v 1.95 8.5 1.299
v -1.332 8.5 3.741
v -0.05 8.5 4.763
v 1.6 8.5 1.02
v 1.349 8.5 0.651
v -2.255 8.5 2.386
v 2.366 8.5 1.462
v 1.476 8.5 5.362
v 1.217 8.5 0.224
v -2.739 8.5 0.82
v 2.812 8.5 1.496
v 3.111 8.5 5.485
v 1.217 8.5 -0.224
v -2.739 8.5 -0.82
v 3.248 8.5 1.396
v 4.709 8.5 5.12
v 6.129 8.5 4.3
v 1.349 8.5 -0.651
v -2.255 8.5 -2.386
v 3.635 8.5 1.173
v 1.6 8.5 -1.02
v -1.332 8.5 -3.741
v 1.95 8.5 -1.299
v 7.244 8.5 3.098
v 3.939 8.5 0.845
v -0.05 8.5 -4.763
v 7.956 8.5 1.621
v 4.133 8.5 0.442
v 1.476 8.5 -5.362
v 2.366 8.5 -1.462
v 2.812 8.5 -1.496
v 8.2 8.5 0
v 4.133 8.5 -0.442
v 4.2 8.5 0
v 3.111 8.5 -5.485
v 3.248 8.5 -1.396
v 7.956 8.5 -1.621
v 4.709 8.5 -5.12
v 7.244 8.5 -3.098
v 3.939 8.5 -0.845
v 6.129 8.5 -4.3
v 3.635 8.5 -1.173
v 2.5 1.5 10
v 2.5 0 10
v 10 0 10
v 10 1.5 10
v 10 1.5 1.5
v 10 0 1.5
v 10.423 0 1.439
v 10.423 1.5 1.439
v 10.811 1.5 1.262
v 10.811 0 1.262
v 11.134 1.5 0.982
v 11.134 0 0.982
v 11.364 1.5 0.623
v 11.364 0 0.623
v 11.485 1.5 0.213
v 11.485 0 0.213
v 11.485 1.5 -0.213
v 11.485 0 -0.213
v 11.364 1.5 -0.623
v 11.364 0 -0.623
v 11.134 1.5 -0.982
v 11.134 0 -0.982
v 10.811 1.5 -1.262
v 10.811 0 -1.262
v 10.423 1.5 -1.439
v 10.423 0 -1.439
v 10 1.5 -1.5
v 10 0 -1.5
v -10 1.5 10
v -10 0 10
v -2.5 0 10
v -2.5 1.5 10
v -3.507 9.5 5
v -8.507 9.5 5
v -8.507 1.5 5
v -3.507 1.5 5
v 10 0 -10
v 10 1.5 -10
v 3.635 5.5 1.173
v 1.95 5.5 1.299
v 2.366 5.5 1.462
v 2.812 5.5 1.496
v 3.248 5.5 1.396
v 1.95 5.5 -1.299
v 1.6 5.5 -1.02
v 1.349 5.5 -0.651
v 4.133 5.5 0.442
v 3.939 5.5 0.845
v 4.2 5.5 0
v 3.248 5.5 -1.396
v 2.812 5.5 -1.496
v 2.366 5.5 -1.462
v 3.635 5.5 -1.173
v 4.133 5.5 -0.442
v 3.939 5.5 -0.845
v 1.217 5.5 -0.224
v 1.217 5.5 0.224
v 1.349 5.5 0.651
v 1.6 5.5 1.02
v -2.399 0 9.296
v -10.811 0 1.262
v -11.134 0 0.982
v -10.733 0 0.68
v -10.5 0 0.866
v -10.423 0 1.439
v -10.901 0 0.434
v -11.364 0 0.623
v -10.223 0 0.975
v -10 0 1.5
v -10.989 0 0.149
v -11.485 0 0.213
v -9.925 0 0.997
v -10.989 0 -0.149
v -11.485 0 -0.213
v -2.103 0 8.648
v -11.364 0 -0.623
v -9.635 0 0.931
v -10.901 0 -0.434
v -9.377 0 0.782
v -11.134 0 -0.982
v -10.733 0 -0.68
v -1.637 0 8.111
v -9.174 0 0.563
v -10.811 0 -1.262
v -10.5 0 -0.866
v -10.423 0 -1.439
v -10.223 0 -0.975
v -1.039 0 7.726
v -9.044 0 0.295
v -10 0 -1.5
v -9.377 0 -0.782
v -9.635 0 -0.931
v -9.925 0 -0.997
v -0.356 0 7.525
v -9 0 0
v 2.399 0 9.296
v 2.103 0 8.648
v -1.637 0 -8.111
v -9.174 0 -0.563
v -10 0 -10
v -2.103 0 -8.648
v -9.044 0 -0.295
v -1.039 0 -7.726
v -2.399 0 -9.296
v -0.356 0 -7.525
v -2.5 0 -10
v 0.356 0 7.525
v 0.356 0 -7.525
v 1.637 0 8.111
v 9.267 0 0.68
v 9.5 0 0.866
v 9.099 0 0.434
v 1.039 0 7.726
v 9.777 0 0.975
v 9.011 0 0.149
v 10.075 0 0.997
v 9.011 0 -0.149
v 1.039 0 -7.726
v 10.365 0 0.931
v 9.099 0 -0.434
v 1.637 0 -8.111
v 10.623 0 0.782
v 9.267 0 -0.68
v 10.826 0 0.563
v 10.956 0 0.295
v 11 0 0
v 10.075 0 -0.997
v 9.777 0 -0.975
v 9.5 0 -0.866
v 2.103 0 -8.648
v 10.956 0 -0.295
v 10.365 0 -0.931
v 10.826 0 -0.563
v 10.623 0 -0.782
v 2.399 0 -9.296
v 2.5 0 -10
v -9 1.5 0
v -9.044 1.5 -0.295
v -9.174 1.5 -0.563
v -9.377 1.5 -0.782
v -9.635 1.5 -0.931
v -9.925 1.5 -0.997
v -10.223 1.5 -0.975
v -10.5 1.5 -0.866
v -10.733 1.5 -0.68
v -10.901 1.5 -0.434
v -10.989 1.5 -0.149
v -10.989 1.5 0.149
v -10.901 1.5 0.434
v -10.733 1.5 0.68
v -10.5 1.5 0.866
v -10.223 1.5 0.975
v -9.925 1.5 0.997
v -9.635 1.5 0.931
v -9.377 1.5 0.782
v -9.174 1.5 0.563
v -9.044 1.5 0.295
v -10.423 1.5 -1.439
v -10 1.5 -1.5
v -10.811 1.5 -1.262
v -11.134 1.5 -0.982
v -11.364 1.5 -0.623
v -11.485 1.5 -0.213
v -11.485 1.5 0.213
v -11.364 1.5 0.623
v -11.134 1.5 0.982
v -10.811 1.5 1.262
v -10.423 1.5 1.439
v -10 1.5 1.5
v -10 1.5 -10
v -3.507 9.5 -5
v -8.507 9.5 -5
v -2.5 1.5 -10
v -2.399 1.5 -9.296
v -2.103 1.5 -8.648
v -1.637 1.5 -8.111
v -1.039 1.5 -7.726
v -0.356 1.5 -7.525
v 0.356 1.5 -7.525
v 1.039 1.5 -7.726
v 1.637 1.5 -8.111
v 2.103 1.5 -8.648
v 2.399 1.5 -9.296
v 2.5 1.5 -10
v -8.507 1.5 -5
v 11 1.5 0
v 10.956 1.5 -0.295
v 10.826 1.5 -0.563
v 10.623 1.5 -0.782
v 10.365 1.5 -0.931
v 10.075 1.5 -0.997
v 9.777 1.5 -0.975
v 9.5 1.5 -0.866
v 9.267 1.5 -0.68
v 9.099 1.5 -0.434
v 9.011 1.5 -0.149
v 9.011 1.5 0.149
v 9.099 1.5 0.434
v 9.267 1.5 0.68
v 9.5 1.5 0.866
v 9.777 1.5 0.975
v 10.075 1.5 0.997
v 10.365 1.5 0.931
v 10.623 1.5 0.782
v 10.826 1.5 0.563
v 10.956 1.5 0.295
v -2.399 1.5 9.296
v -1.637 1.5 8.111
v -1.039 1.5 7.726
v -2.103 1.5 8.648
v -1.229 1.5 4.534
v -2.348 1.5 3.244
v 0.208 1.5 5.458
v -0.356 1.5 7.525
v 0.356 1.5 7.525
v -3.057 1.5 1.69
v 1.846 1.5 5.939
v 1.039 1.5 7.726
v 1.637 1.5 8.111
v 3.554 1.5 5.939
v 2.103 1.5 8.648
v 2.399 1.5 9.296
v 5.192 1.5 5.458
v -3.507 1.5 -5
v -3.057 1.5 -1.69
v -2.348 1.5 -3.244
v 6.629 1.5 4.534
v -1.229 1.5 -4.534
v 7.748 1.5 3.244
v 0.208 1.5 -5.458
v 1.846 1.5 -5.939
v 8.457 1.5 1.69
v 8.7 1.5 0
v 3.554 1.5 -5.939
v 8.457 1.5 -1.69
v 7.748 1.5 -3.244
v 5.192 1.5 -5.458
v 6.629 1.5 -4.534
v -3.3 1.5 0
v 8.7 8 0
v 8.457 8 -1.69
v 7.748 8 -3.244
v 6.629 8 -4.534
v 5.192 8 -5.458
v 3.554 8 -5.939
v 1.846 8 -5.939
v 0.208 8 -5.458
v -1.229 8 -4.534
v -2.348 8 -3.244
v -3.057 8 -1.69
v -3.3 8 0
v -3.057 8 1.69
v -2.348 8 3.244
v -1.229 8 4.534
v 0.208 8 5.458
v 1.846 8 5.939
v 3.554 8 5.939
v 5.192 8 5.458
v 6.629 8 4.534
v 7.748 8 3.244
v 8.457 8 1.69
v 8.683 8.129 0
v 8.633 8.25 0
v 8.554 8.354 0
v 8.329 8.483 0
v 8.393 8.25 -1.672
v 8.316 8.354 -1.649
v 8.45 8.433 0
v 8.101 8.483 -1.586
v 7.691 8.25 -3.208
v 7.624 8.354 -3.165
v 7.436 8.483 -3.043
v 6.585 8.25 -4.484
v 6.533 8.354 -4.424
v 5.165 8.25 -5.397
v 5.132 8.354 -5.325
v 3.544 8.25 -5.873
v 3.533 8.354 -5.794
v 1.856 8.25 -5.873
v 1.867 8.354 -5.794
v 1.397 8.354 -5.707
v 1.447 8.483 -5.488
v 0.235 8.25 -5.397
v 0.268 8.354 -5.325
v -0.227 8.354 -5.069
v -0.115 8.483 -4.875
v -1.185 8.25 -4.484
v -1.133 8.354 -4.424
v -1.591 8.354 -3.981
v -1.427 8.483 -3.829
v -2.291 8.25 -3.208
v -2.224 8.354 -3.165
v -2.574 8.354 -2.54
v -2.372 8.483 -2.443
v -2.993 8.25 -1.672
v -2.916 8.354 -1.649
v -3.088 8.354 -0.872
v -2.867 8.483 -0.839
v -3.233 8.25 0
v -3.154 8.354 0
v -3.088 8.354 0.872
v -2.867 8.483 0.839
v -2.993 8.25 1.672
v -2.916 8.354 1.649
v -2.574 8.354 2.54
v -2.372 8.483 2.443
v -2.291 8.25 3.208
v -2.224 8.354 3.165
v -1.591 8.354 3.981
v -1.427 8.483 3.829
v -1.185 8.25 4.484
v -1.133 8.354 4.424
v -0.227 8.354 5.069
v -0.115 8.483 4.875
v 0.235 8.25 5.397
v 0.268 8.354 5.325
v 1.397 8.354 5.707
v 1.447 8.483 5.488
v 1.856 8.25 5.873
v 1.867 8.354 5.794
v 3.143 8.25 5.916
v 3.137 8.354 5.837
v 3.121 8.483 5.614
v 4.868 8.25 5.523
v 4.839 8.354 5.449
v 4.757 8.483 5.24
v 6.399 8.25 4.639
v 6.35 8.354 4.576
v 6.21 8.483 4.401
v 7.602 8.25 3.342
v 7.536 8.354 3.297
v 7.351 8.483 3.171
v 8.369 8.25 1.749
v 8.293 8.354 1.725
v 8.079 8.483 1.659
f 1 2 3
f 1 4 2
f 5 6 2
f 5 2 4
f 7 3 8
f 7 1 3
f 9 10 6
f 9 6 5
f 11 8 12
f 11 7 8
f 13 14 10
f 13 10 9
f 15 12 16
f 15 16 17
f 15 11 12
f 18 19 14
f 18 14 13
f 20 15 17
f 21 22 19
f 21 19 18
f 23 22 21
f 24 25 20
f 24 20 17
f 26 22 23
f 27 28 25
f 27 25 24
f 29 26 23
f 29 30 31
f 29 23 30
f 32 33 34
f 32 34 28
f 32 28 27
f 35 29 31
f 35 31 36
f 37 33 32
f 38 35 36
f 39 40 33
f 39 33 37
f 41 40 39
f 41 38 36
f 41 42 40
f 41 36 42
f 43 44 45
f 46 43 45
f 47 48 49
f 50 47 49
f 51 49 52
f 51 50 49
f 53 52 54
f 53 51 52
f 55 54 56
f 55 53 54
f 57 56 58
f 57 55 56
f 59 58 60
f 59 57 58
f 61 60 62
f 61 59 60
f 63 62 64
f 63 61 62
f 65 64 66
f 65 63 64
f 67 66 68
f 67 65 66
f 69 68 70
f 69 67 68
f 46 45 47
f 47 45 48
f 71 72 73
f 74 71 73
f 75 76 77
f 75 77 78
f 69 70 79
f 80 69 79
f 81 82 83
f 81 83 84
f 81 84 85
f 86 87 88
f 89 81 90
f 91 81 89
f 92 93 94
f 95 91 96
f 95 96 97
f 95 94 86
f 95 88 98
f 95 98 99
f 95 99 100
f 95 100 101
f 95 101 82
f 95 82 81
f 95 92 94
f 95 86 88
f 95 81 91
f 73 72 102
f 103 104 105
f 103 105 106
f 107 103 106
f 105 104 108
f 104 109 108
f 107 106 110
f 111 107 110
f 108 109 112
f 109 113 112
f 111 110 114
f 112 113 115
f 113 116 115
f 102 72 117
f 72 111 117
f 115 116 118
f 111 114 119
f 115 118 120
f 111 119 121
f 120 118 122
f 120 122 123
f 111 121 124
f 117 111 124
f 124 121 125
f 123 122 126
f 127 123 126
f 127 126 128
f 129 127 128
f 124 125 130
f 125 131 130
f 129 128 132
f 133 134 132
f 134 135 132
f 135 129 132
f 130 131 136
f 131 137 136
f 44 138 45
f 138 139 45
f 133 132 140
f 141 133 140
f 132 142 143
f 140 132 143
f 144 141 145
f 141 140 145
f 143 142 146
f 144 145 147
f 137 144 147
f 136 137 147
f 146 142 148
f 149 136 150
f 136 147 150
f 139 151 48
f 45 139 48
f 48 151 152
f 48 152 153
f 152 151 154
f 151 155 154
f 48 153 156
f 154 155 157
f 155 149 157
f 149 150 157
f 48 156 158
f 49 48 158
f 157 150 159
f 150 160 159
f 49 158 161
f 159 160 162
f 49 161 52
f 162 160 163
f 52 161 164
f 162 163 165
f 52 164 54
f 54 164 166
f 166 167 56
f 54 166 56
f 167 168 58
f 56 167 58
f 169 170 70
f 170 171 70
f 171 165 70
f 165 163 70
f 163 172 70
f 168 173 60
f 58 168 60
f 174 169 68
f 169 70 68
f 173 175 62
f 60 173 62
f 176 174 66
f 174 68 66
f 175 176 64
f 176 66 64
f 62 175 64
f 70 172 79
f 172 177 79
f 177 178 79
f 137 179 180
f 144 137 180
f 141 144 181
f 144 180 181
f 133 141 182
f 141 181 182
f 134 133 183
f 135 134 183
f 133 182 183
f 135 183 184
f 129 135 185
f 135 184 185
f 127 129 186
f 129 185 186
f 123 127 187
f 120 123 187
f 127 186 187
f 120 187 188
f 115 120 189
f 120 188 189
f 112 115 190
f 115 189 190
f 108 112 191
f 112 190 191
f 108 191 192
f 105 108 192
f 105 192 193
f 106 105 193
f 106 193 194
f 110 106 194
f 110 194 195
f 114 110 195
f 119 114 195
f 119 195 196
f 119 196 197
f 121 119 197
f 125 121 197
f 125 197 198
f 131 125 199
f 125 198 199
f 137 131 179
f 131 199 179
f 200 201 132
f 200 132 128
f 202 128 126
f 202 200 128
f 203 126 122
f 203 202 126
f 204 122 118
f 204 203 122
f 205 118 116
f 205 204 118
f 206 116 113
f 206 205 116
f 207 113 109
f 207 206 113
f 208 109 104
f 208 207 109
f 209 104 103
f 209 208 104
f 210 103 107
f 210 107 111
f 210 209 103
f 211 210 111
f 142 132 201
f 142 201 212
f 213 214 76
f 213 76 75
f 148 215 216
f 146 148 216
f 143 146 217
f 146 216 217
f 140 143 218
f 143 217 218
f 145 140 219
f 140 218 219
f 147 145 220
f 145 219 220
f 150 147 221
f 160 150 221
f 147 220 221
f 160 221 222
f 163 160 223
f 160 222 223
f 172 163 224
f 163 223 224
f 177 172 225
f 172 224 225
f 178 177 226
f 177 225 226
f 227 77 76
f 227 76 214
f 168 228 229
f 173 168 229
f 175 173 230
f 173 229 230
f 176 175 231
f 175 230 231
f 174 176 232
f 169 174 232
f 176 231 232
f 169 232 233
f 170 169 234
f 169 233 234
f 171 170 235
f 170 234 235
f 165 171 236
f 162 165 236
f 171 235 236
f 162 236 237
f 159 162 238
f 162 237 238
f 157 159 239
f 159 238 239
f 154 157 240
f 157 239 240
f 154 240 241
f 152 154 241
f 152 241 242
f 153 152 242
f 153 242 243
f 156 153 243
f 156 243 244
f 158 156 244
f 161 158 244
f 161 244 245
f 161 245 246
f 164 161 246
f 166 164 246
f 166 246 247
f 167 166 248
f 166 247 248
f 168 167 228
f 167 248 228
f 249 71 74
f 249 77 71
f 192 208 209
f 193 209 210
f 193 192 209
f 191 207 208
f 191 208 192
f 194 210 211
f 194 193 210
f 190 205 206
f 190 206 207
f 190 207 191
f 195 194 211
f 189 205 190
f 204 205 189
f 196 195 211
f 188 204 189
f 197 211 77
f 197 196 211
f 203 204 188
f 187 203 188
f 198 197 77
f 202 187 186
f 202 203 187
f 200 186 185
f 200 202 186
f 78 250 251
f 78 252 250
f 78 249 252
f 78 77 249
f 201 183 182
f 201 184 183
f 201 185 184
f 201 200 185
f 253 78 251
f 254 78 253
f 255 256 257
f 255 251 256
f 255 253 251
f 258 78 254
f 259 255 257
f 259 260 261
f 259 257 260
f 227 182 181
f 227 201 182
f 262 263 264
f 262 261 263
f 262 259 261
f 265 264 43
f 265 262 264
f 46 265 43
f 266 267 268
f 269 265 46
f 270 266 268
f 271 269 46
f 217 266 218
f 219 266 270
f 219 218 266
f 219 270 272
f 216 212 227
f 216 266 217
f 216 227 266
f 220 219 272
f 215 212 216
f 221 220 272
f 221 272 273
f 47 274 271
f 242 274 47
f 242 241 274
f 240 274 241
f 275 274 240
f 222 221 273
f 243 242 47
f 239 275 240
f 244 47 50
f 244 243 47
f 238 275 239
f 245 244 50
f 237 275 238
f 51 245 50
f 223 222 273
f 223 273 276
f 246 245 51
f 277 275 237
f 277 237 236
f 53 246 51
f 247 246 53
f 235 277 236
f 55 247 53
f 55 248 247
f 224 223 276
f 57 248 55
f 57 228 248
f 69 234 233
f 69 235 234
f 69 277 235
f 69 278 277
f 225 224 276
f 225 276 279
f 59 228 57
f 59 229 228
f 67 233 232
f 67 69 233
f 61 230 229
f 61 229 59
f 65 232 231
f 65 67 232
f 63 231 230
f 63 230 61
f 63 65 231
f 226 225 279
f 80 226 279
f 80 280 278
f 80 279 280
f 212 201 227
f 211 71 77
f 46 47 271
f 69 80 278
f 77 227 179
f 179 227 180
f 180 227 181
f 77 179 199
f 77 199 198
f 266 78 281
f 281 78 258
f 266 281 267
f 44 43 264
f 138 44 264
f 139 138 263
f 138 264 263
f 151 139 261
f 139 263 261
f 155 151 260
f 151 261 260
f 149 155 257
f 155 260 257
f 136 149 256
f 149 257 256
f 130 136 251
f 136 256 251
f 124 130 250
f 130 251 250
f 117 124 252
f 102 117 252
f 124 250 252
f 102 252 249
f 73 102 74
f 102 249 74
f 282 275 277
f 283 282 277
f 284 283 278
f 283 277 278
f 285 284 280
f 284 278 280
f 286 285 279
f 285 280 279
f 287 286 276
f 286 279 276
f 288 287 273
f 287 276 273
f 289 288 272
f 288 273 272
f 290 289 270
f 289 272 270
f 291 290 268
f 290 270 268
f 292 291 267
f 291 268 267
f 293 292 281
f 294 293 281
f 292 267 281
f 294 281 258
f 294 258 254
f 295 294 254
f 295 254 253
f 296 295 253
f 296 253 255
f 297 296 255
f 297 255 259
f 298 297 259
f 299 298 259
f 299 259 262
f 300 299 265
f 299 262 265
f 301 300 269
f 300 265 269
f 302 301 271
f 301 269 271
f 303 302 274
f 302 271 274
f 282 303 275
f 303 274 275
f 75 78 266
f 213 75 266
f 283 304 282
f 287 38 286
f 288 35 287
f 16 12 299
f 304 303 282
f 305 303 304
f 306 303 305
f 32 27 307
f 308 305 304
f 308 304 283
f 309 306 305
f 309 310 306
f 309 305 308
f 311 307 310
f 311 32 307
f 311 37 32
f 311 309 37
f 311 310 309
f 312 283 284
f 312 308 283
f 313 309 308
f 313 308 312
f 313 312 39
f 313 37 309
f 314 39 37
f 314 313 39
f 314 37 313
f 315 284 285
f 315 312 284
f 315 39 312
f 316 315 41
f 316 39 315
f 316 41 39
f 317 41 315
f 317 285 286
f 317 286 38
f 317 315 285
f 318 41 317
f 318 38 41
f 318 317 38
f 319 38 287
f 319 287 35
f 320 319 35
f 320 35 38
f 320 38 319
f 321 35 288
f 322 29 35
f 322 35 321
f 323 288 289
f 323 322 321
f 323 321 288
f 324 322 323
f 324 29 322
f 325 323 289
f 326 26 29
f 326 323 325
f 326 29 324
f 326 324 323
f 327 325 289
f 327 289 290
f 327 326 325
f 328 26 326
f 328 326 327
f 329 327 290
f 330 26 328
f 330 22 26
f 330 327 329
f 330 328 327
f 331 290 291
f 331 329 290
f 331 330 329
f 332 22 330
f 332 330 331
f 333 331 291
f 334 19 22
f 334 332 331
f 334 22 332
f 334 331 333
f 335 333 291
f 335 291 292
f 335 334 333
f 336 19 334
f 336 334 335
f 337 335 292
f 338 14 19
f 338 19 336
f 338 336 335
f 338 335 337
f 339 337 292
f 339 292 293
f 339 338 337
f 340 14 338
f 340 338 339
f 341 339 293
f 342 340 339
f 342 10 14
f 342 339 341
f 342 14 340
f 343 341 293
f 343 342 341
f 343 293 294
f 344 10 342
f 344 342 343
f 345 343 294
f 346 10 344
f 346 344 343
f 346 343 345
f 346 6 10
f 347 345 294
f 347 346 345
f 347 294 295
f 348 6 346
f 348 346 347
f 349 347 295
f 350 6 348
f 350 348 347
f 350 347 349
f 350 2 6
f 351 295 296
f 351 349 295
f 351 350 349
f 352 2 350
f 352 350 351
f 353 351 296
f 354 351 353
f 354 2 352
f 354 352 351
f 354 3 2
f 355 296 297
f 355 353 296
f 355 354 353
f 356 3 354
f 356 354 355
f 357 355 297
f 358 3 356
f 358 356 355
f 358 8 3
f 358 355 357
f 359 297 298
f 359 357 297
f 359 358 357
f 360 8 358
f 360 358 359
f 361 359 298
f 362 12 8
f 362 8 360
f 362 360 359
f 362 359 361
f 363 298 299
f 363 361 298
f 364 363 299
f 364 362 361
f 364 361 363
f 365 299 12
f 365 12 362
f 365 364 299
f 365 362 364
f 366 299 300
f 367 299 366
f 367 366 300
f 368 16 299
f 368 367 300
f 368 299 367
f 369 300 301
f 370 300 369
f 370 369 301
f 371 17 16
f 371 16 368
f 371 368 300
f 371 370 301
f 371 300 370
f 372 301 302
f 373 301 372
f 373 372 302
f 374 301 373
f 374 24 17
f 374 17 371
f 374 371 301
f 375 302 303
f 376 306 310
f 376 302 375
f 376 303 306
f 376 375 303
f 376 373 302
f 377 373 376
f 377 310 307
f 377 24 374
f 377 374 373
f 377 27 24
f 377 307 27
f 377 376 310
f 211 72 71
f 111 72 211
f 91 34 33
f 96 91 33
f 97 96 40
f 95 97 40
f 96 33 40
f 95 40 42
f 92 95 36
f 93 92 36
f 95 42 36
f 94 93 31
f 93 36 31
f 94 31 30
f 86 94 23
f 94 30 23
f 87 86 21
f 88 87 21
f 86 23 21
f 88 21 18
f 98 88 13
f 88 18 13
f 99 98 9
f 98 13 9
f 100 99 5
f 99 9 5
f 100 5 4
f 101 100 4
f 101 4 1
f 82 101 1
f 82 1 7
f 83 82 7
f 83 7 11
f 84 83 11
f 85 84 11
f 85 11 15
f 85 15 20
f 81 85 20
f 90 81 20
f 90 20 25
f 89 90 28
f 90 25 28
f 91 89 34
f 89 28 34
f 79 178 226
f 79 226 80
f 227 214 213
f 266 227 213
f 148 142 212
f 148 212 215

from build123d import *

# Parameters (mm, degrees)
SKETCH3_W           = 20
SKETCH3_H           = 20
BOSS_EXTRUDE1_DEPTH = 1.5
SKETCH4_R           = 1.5
BOSS_EXTRUDE2_DEPTH = 1.5
SKETCH5_R           = 1
SKETCH5_R_2         = 2.5
CUT_EXTRUDE1_DEPTH  = 1.5
SKETCH6_W           = 5
SKETCH6_H           = 10
BOSS_EXTRUDE3_DEPTH = 8
SKETCH7_R           = 6
BOSS_EXTRUDE4_DEPTH = 7
FILLET1_R           = 0.5
SKETCH8_R           = 1.5
CUT_EXTRUDE2_DEPTH  = 3


with BuildPart() as part:
    # Sketch3 → Boss-Extrude1 (new body)
    with BuildSketch(Plane(origin=(0, 0, 0), x_dir=(1, 0, 0), z_dir=(0, 1, 0))):
        Rectangle(SKETCH3_W, SKETCH3_H)
    extrude(amount=BOSS_EXTRUDE1_DEPTH)

    # Sketch4 → Boss-Extrude2 (add)
    with BuildSketch(Plane(origin=(0, 1.5, 0), x_dir=(1, 0, 0), z_dir=(0, 1, 0))):
        with Locations((-10, 0)):
            Circle(SKETCH4_R)
        with Locations((10, 0)):
            Circle(SKETCH4_R)
    extrude(amount=-BOSS_EXTRUDE2_DEPTH)

    # Sketch5 → Cut-Extrude1 (cut)
    with BuildSketch(Plane(origin=(0, 1.5, 0), x_dir=(1, 0, 0), z_dir=(0, 1, 0))):
        with Locations((-10, 0)):
            Circle(SKETCH5_R)
        with Locations((10, 0)):
            Circle(SKETCH5_R)
        with Locations((0, 10)):
            Circle(SKETCH5_R_2)
        with Locations((0, -10)):
            Circle(SKETCH5_R_2)
    extrude(amount=-CUT_EXTRUDE1_DEPTH, mode=Mode.SUBTRACT)

    # Sketch6 → Boss-Extrude3 (add)
    with BuildSketch(Plane(origin=(0, 1.5, 0), x_dir=(1, 0, 0), z_dir=(0, 1, 0))):
        with Locations((-6.006775527, 0)):
            Rectangle(SKETCH6_W, SKETCH6_H)
    extrude(amount=BOSS_EXTRUDE3_DEPTH)

    # Sketch7 → Boss-Extrude4 (add)
    with BuildSketch(Plane(origin=(0, 1.5, 0), x_dir=(1, 0, 0), z_dir=(0, 1, 0))):
        with Locations((2.7, 0)):
            Circle(SKETCH7_R)
    extrude(amount=BOSS_EXTRUDE4_DEPTH)

    # Fillet1
    fillet1_edges = [part.edges().sort_by_distance(p)[0] for p in [
        (-3.3, 8.5, 0),
    ]]
    fillet(fillet1_edges, radius=FILLET1_R)

    # Sketch8 → Cut-Extrude2 (cut)
    with BuildSketch(Plane(origin=(0, 8.5, 0), x_dir=(1, 0, 0), z_dir=(0, 1, 0))):
        with Locations((2.7, 0)):
            Circle(SKETCH8_R)
    extrude(amount=-CUT_EXTRUDE2_DEPTH, mode=Mode.SUBTRACT)


solid = part.part
